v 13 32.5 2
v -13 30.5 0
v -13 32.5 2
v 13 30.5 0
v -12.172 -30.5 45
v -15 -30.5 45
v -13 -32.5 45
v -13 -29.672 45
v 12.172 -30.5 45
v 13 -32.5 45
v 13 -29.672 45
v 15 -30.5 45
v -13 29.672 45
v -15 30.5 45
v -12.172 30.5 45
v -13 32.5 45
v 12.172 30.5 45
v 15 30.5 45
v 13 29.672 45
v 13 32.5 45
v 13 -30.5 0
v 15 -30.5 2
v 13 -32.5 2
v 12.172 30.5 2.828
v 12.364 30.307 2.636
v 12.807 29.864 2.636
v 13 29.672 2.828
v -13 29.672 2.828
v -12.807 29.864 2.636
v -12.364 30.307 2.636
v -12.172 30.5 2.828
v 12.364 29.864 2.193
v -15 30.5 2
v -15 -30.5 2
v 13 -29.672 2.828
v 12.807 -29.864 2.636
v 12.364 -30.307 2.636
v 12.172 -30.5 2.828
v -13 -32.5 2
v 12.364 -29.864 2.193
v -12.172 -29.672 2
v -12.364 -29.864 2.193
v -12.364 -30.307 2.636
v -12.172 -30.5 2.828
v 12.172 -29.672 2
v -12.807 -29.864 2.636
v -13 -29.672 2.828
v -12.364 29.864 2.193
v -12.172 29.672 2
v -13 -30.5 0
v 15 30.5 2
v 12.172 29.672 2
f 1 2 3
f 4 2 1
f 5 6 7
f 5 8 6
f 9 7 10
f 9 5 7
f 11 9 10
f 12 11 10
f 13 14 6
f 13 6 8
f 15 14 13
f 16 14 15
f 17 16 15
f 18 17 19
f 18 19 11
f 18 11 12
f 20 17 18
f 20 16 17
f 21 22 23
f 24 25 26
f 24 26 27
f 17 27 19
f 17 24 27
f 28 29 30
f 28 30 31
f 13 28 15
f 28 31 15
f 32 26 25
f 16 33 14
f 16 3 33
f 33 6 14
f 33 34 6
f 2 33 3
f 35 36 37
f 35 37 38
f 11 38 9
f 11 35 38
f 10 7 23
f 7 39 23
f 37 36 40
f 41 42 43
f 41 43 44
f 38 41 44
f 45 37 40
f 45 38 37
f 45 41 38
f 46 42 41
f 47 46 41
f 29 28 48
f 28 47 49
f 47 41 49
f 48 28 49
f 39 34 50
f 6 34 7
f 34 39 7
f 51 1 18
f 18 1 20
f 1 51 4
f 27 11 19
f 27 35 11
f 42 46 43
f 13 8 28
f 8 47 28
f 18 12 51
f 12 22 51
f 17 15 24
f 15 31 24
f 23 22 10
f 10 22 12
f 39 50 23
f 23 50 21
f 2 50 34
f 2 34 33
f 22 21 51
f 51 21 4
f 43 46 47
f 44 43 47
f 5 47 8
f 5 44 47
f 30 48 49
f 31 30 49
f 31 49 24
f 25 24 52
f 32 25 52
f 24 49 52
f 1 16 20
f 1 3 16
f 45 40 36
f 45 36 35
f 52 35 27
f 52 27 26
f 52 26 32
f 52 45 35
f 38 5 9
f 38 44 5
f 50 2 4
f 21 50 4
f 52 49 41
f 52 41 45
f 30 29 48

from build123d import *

# Parameters (mm, degrees)
F0_W     = 30
F0_H     = 65
F1_DEPTH = 45
F2_SIZE  = 2
F3_T     = -2


with BuildPart() as f1:
    # F0 (on Top) → F1 (new body)
    with BuildSketch(Plane.XY):
        Rectangle(F0_W, F0_H)
    extrude(amount=F1_DEPTH)

    # F2
    f2_edges = [f1.edges().sort_by_distance(p)[0] for p in [
        (15, -32.5, 22.5),
        (-15, -32.5, 22.5),
        (15, 32.5, 22.5),
        (-15, 32.5, 22.5),
        (15, 0, 0),
        (-15, 0, 0),
        (0, 32.5, 0),
        (0, -32.5, 0),
    ]]
    chamfer(f2_edges, length=F2_SIZE)

    # F3
    f3_openings = [f1.faces().sort_by_distance(p)[0] for p in [
        (0, 0, 45),
    ]]
    offset(amount=F3_T, openings=f3_openings)


solid = f1.part
